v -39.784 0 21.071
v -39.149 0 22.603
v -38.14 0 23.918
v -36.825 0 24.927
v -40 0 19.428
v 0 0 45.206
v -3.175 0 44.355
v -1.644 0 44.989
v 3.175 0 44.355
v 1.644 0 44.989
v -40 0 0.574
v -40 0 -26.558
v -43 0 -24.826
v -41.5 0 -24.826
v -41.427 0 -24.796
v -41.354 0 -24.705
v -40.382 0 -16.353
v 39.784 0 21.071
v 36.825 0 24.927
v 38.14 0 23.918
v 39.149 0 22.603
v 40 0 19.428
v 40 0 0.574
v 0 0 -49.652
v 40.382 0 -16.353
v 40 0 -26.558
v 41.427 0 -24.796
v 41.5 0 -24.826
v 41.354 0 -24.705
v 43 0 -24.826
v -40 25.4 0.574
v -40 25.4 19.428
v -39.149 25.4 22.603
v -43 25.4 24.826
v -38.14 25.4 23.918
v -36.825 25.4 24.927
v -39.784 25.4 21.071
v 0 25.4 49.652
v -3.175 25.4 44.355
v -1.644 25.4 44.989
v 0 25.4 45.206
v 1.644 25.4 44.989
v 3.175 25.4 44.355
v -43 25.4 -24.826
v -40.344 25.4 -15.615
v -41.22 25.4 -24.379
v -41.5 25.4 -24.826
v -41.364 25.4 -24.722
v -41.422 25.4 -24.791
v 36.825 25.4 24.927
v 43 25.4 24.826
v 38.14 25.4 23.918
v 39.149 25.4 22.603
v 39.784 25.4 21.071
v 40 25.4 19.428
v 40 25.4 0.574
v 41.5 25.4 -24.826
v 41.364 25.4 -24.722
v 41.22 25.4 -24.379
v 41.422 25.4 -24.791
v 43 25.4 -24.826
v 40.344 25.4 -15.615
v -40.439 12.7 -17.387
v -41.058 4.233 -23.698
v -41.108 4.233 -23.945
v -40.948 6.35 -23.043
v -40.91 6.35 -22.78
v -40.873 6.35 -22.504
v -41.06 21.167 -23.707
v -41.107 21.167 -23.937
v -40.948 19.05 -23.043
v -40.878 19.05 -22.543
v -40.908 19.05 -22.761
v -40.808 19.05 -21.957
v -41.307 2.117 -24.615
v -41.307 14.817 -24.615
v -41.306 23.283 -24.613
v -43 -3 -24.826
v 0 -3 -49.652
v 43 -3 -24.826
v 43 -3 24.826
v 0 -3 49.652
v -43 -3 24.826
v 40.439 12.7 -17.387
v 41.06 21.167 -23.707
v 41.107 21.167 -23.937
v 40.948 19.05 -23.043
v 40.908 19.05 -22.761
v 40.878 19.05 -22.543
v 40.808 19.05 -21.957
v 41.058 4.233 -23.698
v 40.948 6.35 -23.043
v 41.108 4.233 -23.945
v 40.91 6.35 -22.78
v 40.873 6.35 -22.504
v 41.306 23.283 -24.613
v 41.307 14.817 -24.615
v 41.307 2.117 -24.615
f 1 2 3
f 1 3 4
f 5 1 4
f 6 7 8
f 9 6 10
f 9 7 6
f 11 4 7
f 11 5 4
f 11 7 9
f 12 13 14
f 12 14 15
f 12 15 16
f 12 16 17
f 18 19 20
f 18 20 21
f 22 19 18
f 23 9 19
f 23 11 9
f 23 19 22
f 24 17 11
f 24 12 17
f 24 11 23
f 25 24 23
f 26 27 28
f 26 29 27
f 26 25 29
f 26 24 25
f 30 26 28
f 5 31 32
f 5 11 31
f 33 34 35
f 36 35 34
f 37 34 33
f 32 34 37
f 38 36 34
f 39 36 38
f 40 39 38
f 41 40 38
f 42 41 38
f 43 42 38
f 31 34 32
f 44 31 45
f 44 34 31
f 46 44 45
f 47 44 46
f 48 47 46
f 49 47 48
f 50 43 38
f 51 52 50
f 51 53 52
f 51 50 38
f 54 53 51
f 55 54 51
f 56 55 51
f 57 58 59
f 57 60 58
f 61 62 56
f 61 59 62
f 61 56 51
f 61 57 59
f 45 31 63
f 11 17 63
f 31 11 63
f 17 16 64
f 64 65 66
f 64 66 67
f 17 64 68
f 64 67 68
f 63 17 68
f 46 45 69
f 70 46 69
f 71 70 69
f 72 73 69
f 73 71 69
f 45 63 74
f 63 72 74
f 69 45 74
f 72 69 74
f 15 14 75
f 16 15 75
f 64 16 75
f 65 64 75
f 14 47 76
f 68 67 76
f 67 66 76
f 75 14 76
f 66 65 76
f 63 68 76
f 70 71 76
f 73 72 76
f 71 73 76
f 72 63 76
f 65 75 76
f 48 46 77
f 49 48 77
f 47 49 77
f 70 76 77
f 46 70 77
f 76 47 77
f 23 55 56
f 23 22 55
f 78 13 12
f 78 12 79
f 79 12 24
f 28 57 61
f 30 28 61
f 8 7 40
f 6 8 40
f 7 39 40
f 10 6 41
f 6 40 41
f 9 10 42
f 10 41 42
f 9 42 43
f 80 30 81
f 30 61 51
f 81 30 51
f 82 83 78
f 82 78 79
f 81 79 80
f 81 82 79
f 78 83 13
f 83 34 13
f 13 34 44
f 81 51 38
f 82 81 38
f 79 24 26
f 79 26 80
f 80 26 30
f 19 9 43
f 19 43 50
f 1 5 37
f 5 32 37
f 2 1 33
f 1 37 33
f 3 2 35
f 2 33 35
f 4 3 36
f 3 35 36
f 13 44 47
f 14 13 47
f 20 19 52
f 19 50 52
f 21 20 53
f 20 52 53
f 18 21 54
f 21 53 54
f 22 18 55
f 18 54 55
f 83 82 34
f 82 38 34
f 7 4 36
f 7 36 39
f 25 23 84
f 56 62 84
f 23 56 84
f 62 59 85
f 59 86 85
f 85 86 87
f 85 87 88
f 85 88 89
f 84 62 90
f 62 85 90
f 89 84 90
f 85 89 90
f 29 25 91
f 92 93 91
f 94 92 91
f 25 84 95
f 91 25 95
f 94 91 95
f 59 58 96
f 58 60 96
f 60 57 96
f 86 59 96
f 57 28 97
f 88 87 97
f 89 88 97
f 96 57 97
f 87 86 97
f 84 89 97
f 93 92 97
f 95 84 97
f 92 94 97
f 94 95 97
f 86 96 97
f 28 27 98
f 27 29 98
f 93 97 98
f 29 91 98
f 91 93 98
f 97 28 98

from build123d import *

# Parameters (mm, degrees)
BOSS_EXTRUDE1_DEPTH = 25.4
BOSS_EXTRUDE2_DEPTH = 3
CUT_EXTRUDE1_DEPTH  = 25.4
SKETCH3_W           = 86
SKETCH3_H           = 1.732050808
CUT_EXTRUDE2_DEPTH  = 25.4
FILLET1_SIZE        = 1.5
FILLET1_SIZE_2      = 25.4
FILLET2_R           = 6.35


# Read off the part's stored shape, not the designer's step: Cut-Extrude1
with BuildPart() as part:
    # Sketch1 → Boss-Extrude1 (new body)
    with BuildSketch(Plane(origin=(0, 0, 0), x_dir=(1, 0, 0), z_dir=(0, 1, 0))):
        Polygon((43, 24.826061575), (0, 49.65212315), (-43, 24.826061575), (-43, -24.826061575), (0, -49.65212315), (43, -24.826061575), align=None)
        Polygon((-40, -23.094010768), (0, -46.188021535), (40, -23.094010768), (40, 23.094010768), (0, 46.188021535), (-40, 23.094010768), align=None, mode=Mode.SUBTRACT)
    extrude(amount=BOSS_EXTRUDE1_DEPTH)

    # Sketch2 → Boss-Extrude2 (add)
    with BuildSketch(Plane.XZ):
        Polygon((43, 24.826061575), (0, 49.65212315), (-43, 24.826061575), (-43, -24.826061575), (0, -49.65212315), (43, -24.826061575), align=None)
    extrude(amount=BOSS_EXTRUDE2_DEPTH)

    # Cut-Extrude1 outline → Cut-Extrude1 (cut)
    with BuildSketch(Plane(origin=(0, 0, 0), x_dir=(1, 0, 0), z_dir=(0, 1, 0))):
        Polygon((40, 26.558112383), (0, 49.65212315), (-40, 26.558112383), (-40, 23.094010768), (0, 46.188021535), (40, 23.094010768), align=None)
    extrude(amount=CUT_EXTRUDE1_DEPTH, mode=Mode.SUBTRACT)

    # Sketch3 → Cut-Extrude2 (cut)
    with BuildSketch(Plane(origin=(0, 25.4, 0), x_dir=(1, 0, 0), z_dir=(0, 1, 0))):
        with Locations((0, 25.692086979)):
            Rectangle(SKETCH3_W, SKETCH3_H)
    extrude(amount=-CUT_EXTRUDE2_DEPTH, mode=Mode.SUBTRACT)

    # Fillet1
    # an asymmetric fillet: 25.4, 1.5 mm, written as the material it takes off along each edge
    with BuildSketch(Plane(origin=(40, 0, -24.826061575), x_dir=(1, 0, 0), z_dir=(0, 1, 0)), Plane(origin=(-40, 88.9, -24.826061575), x_dir=(-1, 0, 0), z_dir=(0, -1, 0))) as fillet1_piece_1:
        with BuildLine():
            Bezier((FILLET1_SIZE, 0), (0, 0), (0, -FILLET1_SIZE_2), weights=[1, 0.707106781, 1])
            Line((0, -FILLET1_SIZE_2), (0, 0))
            Line((0, 0), (FILLET1_SIZE, 0))
        make_face()
    extrude(amount=88.9, mode=Mode.SUBTRACT)

    # Fillet2
    fillet2_edges = [part.edges().sort_by_distance(p)[0] for p in [
        (-40, 12.7, 23.094010768),
        (0, 12.7, 46.188021535),
        (40, 12.7, 23.094010768),
    ]]
    fillet(fillet2_edges, radius=FILLET2_R)


solid = part.part
